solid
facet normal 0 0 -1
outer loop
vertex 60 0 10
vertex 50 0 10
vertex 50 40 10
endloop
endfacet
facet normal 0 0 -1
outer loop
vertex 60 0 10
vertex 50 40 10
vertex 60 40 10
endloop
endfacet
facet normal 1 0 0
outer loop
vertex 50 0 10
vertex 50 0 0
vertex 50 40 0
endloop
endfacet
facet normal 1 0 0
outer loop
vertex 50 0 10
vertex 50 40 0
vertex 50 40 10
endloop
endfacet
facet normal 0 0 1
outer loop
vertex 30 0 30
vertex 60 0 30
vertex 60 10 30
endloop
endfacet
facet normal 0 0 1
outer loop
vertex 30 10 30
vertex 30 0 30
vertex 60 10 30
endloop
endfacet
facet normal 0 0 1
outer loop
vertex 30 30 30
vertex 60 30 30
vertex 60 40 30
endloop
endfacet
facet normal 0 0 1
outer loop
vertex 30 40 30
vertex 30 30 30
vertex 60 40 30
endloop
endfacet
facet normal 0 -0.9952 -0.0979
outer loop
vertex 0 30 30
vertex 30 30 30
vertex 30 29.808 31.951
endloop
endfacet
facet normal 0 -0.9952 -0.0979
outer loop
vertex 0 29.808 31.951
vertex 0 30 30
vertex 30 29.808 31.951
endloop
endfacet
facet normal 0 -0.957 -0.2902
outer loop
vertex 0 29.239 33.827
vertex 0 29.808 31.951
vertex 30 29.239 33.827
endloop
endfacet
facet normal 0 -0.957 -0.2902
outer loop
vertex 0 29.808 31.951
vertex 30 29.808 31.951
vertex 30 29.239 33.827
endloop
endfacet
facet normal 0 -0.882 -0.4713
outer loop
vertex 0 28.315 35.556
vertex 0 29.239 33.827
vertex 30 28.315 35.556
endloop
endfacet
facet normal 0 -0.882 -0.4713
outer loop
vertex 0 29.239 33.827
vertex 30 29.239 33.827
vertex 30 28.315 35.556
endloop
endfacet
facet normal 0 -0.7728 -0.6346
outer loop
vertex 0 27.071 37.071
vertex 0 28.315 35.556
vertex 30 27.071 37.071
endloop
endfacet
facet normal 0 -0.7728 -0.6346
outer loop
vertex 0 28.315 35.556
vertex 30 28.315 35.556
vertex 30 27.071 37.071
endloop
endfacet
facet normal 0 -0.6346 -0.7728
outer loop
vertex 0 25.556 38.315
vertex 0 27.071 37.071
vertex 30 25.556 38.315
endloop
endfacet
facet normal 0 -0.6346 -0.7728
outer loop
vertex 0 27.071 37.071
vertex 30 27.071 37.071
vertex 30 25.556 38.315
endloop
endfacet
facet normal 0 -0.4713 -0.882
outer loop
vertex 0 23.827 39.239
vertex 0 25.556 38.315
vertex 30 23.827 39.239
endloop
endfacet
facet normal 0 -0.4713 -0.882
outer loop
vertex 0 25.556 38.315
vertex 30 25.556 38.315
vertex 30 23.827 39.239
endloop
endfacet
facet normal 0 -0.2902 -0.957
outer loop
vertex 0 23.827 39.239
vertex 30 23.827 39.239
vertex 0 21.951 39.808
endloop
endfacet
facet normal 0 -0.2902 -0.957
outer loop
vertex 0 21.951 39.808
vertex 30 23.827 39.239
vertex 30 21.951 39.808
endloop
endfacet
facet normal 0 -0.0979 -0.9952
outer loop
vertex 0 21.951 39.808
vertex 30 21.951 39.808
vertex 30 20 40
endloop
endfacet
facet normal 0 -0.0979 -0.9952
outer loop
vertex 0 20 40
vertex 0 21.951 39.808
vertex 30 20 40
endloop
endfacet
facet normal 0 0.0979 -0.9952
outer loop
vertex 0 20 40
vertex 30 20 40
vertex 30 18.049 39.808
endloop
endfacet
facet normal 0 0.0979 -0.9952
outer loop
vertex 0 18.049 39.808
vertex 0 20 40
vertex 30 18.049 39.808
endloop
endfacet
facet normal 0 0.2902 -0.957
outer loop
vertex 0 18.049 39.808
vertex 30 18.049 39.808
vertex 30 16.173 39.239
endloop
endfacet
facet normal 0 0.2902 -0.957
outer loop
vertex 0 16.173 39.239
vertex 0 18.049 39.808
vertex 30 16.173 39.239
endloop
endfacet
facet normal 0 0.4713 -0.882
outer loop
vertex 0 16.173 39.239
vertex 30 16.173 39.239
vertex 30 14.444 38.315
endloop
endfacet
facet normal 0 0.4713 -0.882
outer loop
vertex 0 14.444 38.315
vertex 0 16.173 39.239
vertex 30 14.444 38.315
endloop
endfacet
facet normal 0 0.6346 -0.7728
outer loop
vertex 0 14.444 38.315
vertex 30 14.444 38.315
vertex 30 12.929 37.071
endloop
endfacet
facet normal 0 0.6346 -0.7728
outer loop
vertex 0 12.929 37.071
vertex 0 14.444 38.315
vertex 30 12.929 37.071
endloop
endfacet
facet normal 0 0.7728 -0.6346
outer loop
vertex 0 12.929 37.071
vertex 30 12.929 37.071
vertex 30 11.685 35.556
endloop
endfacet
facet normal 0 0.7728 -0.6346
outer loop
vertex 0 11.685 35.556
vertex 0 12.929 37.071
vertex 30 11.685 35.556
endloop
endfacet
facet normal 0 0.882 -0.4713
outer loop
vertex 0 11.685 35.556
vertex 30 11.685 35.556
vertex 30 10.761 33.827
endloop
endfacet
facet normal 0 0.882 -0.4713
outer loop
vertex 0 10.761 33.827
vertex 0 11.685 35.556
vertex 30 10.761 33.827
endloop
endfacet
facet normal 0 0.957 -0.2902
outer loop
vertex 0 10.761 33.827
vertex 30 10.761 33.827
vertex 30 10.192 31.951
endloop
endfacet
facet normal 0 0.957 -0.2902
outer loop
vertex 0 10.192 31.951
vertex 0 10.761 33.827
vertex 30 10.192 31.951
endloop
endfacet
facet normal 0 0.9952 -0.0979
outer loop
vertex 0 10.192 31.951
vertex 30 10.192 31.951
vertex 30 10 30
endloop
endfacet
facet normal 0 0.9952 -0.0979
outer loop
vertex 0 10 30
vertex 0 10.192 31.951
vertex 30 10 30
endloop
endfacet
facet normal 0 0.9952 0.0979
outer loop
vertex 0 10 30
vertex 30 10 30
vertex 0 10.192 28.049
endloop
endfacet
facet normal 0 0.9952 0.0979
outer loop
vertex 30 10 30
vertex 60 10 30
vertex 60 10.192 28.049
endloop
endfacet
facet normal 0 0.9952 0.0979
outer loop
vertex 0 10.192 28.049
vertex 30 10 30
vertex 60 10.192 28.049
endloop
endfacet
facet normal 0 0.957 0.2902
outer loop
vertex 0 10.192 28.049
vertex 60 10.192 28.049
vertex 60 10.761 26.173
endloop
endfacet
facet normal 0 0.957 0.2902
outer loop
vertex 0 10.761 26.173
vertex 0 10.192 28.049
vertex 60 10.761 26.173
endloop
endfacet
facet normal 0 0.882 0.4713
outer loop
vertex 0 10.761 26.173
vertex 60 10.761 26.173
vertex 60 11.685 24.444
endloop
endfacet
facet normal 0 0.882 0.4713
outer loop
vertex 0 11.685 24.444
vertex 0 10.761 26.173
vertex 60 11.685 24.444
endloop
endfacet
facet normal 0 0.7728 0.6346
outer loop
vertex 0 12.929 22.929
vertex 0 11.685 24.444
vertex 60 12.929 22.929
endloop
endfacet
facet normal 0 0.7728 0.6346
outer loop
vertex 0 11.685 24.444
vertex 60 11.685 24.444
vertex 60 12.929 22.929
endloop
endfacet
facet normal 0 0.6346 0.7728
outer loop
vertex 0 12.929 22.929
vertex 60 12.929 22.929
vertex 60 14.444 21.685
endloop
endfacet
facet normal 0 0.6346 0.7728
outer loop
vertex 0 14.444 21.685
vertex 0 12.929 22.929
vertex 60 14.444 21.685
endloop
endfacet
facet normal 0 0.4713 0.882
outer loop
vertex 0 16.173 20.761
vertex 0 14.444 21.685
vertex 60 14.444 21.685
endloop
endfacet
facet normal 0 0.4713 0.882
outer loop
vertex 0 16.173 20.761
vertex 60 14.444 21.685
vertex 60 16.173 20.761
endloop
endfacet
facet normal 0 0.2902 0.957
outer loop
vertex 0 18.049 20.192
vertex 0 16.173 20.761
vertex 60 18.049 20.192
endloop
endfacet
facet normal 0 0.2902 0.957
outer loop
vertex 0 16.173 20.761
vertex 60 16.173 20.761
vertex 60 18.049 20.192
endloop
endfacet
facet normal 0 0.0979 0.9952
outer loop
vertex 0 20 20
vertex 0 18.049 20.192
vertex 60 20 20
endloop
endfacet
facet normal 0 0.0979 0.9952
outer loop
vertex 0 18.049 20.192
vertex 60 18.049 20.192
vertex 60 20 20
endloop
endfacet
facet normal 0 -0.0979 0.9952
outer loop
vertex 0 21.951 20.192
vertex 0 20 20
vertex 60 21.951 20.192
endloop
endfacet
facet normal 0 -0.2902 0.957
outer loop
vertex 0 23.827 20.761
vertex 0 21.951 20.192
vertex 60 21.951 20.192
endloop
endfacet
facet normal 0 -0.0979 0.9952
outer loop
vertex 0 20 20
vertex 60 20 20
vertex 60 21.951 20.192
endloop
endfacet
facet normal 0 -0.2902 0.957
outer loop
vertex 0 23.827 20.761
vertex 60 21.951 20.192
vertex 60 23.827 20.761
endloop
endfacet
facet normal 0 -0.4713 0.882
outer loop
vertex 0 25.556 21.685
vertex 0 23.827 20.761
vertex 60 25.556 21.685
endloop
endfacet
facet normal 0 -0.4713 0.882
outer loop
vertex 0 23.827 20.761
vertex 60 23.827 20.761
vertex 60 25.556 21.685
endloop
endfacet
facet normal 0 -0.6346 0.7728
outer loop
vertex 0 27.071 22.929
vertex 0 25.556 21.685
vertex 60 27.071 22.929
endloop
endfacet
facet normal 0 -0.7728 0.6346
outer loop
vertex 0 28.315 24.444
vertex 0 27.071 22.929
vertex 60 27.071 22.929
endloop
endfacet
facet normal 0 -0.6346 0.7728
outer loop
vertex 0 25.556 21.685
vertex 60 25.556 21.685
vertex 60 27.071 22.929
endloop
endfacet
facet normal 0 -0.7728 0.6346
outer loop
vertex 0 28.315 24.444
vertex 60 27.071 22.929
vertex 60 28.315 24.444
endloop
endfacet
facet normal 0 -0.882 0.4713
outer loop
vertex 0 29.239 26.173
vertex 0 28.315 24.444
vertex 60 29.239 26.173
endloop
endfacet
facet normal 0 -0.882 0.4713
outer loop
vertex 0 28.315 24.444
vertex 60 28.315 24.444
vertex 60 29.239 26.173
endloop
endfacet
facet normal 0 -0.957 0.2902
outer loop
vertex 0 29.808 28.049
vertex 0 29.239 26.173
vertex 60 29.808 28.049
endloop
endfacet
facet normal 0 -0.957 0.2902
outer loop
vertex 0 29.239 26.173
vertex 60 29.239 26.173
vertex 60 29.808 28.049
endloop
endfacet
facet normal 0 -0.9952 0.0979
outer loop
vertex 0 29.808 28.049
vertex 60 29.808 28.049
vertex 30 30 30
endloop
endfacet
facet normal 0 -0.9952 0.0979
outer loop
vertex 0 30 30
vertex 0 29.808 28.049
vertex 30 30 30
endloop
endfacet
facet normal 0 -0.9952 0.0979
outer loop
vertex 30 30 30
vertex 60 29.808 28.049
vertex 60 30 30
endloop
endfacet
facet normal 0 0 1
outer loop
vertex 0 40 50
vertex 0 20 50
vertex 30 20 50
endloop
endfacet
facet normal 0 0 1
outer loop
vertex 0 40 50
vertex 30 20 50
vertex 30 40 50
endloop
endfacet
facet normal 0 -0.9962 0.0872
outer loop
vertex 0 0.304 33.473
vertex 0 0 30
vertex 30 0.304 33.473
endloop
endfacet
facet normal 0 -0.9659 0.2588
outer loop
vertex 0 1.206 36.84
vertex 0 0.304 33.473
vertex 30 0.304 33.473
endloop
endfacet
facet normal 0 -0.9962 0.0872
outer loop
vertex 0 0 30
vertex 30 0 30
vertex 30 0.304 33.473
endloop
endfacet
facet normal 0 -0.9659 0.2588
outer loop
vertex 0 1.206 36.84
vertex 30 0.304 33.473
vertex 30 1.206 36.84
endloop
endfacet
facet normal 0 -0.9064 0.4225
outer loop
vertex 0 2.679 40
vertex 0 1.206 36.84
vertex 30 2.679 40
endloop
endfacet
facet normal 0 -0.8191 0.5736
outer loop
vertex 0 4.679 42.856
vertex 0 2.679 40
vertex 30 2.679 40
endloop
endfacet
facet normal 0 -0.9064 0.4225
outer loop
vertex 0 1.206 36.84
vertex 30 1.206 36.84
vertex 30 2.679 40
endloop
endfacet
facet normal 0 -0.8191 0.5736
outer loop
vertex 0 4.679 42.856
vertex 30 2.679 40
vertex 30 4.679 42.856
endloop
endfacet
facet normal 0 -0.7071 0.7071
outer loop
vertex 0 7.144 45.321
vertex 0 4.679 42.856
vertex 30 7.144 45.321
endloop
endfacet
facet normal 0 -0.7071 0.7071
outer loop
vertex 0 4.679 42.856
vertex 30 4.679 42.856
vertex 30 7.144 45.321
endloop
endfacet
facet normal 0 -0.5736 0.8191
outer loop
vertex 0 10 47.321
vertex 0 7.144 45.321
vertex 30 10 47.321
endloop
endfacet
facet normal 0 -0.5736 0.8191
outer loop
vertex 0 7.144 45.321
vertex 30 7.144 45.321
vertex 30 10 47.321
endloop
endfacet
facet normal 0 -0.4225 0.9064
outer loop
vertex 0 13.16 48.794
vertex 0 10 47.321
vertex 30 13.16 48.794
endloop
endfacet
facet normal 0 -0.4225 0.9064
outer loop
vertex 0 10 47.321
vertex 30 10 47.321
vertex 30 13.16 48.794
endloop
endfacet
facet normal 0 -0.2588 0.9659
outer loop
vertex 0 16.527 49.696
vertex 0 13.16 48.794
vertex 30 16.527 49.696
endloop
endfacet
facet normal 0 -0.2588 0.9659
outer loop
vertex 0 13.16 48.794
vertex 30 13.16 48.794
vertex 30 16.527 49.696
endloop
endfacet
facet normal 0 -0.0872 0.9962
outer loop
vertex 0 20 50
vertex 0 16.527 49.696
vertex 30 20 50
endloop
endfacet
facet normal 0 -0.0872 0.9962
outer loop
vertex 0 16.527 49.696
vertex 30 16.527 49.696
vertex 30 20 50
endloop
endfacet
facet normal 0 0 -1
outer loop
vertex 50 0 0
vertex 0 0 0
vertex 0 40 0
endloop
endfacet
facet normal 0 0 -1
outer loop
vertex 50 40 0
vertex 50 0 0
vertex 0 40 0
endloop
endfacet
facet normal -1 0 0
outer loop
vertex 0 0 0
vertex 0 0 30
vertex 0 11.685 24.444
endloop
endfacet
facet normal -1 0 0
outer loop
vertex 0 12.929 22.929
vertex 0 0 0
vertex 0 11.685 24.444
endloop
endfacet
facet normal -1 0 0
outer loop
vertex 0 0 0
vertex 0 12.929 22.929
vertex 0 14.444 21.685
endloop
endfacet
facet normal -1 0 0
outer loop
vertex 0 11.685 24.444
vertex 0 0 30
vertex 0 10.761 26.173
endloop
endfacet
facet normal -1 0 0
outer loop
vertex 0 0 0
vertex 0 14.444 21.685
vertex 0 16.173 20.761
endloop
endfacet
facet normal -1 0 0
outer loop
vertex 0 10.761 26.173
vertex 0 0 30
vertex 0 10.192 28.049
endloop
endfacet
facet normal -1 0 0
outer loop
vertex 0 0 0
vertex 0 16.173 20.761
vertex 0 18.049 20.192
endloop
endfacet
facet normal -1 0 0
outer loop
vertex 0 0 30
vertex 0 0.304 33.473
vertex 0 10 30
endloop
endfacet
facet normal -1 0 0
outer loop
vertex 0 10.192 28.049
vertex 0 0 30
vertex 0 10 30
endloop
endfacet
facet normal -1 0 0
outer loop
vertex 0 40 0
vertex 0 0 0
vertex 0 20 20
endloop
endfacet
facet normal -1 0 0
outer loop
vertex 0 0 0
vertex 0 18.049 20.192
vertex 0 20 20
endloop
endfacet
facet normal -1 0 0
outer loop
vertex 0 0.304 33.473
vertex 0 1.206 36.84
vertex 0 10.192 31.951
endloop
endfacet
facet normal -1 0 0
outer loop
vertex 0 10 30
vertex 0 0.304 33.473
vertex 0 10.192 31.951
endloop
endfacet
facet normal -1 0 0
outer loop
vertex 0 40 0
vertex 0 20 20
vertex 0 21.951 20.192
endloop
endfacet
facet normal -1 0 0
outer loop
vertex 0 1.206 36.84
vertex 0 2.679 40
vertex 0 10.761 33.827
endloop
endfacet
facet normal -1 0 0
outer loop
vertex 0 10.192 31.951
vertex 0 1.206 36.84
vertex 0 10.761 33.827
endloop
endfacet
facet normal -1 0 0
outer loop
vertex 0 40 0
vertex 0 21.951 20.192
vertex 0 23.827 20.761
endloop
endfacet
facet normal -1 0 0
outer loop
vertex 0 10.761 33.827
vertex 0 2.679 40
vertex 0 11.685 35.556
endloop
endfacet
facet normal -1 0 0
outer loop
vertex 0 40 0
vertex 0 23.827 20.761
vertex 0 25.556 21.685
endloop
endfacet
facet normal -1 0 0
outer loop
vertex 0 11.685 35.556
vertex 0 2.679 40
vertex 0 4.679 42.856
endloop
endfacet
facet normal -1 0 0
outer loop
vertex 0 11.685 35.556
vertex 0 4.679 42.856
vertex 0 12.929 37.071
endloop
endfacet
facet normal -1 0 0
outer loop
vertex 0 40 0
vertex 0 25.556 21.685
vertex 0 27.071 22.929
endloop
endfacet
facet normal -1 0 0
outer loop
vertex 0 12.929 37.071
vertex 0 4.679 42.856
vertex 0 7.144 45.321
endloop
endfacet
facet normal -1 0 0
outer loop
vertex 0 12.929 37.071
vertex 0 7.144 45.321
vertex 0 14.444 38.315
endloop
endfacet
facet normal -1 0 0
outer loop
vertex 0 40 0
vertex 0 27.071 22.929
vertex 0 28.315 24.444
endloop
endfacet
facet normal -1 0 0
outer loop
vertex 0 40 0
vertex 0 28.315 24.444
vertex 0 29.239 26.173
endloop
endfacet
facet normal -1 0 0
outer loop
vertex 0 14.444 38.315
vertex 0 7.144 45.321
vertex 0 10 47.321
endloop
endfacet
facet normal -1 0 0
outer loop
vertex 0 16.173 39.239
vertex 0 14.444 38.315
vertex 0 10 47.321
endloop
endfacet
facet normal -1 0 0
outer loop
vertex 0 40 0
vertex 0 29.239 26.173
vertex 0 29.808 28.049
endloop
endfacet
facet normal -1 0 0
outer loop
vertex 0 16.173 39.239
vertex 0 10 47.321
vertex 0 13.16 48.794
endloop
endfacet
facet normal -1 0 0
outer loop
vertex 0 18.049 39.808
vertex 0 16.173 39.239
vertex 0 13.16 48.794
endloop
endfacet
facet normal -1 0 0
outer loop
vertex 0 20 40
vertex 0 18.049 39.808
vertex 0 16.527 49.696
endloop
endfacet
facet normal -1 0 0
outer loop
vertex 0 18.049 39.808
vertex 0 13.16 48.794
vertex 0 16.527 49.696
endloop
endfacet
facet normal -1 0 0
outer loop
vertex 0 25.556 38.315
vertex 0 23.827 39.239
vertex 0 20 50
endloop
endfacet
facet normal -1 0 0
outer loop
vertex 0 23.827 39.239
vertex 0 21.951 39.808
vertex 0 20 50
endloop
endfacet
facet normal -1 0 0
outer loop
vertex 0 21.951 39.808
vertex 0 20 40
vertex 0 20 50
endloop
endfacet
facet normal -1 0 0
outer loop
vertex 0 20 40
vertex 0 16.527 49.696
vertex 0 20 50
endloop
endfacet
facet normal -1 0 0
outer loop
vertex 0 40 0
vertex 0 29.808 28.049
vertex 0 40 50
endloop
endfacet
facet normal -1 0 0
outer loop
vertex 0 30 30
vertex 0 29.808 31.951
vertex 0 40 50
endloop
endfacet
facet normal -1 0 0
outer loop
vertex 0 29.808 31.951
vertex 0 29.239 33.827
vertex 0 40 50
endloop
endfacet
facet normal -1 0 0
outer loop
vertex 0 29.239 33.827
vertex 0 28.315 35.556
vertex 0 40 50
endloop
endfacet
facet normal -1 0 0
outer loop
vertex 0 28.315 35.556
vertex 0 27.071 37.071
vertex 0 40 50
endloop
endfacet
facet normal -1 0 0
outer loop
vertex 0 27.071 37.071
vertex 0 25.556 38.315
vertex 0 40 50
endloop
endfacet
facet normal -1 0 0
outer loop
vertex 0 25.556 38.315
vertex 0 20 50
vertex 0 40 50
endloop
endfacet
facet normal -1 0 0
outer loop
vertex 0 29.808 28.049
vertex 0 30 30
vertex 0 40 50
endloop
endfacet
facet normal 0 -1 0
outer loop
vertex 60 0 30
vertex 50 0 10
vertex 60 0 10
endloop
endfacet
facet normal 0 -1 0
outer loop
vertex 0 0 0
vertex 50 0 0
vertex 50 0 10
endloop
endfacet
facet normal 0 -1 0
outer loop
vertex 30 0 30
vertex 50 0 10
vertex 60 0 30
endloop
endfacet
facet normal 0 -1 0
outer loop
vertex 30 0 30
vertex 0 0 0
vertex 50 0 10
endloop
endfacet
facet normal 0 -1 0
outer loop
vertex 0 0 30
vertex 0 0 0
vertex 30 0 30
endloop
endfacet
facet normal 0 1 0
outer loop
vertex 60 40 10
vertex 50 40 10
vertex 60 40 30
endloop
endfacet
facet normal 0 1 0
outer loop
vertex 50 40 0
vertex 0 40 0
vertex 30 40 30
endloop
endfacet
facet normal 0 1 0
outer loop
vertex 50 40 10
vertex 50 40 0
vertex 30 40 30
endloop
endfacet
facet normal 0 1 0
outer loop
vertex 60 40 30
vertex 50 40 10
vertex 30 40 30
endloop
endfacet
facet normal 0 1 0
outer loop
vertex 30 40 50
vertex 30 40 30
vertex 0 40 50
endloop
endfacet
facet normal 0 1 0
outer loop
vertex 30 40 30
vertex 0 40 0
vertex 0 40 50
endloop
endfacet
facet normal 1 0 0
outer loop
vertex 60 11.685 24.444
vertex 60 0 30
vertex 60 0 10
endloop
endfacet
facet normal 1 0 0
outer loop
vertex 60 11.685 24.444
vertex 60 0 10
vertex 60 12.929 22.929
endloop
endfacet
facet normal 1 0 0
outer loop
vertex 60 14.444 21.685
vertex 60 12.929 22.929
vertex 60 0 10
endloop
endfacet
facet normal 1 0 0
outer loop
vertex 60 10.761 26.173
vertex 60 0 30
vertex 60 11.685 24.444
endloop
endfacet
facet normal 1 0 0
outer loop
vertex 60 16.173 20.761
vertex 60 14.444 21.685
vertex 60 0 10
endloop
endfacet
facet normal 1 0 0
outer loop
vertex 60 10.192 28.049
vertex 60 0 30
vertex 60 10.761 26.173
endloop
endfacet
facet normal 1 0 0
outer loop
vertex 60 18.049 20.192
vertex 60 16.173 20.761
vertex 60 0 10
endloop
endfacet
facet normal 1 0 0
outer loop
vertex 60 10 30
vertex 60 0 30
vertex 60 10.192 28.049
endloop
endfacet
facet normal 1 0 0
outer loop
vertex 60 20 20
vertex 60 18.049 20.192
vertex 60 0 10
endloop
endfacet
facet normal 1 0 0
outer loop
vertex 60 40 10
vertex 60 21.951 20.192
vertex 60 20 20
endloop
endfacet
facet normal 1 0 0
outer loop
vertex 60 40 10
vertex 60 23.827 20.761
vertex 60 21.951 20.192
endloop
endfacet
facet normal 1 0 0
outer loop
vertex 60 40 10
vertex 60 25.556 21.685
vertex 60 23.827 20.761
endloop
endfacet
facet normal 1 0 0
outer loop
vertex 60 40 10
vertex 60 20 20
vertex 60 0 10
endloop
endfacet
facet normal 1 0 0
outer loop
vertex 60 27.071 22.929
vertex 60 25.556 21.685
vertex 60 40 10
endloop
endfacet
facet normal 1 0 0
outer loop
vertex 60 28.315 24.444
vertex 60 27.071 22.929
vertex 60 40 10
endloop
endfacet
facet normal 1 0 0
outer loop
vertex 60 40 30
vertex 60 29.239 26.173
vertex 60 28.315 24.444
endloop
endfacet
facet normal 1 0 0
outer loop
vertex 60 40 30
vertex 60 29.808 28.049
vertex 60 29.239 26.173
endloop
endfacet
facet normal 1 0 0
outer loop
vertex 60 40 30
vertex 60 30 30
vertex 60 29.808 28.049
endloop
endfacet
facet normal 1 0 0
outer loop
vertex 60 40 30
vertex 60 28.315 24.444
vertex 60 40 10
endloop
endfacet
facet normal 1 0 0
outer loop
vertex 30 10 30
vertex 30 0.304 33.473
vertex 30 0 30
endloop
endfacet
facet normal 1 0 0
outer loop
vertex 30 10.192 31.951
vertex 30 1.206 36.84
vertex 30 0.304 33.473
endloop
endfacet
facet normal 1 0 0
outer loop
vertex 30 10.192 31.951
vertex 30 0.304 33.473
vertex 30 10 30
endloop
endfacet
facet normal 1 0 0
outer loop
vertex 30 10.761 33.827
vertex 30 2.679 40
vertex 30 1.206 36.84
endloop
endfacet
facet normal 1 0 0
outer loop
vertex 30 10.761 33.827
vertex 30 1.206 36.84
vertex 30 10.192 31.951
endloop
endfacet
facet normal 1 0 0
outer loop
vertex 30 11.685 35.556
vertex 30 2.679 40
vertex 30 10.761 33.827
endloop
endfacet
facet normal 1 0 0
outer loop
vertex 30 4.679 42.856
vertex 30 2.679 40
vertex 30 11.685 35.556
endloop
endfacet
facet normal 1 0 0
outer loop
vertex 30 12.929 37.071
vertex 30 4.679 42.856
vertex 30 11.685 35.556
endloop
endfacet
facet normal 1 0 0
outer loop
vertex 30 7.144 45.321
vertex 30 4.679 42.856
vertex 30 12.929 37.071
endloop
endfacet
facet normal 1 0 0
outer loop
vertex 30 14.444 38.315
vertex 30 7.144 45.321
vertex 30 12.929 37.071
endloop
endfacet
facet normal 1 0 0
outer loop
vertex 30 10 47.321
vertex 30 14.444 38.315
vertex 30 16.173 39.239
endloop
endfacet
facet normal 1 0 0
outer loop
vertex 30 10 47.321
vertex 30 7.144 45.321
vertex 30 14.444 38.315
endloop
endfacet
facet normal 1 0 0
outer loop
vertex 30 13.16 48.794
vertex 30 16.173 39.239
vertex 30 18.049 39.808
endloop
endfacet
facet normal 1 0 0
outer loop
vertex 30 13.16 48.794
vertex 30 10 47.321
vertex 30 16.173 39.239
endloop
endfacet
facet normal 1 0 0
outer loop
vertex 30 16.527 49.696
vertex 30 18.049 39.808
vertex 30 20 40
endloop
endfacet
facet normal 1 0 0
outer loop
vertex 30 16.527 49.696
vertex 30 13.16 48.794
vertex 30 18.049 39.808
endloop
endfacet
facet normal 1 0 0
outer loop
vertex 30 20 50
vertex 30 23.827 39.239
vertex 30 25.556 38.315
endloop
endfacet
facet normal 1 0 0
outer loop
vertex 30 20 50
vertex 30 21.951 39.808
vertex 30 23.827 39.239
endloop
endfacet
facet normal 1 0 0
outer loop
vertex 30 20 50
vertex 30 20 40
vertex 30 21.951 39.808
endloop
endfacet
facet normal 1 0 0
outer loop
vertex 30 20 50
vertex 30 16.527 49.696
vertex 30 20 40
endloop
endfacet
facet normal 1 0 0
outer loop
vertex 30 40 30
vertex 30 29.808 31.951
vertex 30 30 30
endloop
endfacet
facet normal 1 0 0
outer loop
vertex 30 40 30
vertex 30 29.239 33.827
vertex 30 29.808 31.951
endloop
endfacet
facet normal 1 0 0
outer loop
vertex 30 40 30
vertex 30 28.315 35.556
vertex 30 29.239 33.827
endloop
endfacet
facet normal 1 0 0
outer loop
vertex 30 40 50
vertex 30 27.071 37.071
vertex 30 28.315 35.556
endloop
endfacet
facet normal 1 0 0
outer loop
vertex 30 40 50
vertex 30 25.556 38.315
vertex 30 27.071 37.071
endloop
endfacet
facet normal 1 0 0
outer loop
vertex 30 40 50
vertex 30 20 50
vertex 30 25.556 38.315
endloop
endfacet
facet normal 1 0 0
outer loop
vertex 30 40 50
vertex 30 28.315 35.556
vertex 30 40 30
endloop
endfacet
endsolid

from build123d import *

# Parameters (mm, degrees)
F0_W     = 40
F0_H     = 50
F1_DEPTH = 60
F2_W     = 40
F2_H     = 20
F3_DEPTH = 30
F5_DEPTH = 60.001
F6_W     = 10
F6_H     = 10
F7_DEPTH = 40.001
F8_R     = 20


with BuildPart() as f1:
    # F0 (on Right) → F1 (new body)
    with BuildSketch(Plane.YZ):
        with Locations((20, 25)):
            Rectangle(F0_W, F0_H)
    extrude(amount=F1_DEPTH)

    # F2 (on face) → F3 (cut)
    with BuildSketch(Plane.YZ.offset(60)):
        with Locations((20, 40)):
            Rectangle(F2_W, F2_H)
    extrude(amount=-F3_DEPTH, mode=Mode.SUBTRACT)

    # F4 (on face) → F5 (cut, through all)
    with BuildSketch(Plane.YZ.offset(60)):
        with BuildLine():
            ThreePointArc((10, 30), (20, 20), (30, 30))
            Line((30, 30), (10, 30))
        make_face()
        with BuildLine():
            Line((10, 30), (30, 30))
            ThreePointArc((30, 30), (20, 40), (10, 30))
        make_face()
    extrude(amount=-F5_DEPTH, mode=Mode.SUBTRACT)

    # F6 (on face) → F7 (cut, through all)
    with BuildSketch(Plane.XZ):
        with Locations((55, 5)):
            Rectangle(F6_W, F6_H)
    extrude(amount=-F7_DEPTH, mode=Mode.SUBTRACT)

    # F8
    f8_edges = [f1.edges().sort_by_distance(p)[0] for p in [
        (15, 0, 50),
    ]]
    fillet(f8_edges, radius=F8_R)


solid = f1.part
